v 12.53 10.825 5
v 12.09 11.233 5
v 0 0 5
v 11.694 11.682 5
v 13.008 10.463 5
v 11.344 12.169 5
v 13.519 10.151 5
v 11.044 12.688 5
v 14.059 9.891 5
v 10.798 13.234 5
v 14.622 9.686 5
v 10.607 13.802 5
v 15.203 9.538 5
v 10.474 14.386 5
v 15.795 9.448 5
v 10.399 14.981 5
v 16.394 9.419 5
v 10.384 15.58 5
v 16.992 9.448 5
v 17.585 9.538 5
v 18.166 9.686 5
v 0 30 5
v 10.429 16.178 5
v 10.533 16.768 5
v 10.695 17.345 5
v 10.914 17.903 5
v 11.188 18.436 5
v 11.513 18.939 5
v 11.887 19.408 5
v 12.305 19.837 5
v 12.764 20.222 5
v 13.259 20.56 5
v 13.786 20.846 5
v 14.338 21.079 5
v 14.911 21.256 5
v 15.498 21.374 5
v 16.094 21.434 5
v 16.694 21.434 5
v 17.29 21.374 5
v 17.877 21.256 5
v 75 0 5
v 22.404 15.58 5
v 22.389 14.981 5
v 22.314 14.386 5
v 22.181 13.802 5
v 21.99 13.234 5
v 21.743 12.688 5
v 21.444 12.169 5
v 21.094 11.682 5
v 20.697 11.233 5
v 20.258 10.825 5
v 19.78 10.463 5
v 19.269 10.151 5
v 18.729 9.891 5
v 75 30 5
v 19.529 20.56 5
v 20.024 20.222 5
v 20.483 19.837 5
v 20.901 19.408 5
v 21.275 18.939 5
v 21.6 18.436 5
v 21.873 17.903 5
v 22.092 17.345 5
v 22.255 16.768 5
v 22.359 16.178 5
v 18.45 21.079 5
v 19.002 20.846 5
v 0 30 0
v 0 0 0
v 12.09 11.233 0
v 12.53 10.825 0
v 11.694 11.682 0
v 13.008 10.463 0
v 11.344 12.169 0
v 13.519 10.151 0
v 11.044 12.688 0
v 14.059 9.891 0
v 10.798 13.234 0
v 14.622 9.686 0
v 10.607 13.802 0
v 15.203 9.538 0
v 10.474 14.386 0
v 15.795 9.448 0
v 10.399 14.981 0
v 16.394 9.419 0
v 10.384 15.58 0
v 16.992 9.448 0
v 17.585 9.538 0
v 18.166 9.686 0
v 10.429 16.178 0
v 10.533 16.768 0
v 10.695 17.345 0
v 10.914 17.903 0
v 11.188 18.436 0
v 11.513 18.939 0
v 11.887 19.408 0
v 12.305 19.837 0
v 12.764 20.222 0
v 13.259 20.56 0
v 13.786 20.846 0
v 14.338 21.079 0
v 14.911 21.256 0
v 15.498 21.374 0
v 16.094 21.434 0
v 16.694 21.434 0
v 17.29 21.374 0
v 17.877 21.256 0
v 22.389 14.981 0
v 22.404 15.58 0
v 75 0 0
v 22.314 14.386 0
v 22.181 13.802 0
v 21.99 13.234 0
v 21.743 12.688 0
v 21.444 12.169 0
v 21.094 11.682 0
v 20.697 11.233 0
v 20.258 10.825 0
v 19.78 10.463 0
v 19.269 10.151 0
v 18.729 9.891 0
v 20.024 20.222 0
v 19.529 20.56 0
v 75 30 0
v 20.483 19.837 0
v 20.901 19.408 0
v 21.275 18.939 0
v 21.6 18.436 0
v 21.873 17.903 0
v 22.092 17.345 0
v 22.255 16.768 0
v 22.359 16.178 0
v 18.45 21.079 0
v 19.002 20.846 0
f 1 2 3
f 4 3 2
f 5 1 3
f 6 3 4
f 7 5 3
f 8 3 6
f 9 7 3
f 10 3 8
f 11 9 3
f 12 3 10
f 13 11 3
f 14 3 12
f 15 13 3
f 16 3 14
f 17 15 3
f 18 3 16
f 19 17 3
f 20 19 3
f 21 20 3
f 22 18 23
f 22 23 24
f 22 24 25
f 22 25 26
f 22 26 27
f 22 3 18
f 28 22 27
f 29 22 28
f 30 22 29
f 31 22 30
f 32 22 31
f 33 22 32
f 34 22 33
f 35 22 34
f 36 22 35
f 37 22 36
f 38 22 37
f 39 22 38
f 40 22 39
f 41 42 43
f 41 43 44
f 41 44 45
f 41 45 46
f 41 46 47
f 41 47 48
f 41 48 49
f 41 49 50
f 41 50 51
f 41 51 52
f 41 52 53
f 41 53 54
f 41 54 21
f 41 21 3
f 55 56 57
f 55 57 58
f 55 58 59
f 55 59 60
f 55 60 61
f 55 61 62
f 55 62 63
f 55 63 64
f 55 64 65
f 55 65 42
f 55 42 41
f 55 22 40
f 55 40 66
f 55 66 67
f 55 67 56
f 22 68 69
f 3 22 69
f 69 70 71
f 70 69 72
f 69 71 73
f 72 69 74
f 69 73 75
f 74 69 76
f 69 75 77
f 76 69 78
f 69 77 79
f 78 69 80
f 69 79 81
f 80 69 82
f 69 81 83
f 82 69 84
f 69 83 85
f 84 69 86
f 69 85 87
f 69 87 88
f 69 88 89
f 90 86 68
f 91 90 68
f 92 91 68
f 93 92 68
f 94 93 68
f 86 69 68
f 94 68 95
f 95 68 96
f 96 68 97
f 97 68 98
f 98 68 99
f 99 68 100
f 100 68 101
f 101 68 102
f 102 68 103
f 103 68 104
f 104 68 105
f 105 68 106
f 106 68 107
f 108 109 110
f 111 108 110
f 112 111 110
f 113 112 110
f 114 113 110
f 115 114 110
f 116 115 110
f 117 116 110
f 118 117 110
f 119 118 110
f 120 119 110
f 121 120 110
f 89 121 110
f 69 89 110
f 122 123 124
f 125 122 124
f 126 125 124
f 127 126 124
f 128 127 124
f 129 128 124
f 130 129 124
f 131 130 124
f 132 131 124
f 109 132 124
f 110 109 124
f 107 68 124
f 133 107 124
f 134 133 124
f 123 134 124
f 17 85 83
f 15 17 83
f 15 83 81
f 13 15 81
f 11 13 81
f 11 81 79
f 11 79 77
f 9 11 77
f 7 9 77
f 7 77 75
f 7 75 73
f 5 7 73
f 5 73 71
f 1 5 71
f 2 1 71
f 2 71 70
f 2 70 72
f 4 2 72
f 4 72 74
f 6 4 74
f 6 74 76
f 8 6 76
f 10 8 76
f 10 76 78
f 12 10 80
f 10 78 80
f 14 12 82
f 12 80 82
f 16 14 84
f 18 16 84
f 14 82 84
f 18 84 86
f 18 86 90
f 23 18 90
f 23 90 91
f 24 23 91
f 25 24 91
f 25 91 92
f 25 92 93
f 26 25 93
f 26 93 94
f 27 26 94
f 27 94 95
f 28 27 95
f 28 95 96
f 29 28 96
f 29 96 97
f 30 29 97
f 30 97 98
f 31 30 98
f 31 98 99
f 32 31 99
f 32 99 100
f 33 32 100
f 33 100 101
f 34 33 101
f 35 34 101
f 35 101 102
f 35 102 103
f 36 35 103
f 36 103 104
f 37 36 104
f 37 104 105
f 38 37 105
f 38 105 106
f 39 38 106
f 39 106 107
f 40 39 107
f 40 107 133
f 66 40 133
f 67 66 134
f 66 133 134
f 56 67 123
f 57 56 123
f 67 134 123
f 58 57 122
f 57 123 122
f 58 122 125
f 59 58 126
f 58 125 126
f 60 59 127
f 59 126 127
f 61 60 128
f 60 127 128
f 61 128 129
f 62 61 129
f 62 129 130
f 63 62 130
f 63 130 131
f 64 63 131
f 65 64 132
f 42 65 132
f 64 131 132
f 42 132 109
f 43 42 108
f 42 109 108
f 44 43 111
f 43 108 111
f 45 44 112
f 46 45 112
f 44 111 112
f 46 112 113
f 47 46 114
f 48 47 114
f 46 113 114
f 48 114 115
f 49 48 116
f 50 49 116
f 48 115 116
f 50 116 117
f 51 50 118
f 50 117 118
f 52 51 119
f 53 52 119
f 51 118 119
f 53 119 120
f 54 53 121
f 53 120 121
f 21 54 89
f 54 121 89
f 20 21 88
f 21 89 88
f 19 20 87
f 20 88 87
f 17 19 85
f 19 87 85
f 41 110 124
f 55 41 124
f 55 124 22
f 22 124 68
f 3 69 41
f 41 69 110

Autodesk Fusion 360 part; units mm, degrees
sketch "Sketch1" plane through (0, 0, 0) normal (0, 0, 1) x (1, 0, 0)
  line L0 (0, 0) -> (75, 0)
  line L1 (75, 0) -> (75, 30)
  line L2 (75, 30) -> (0, 30)
  line L3 (0, 30) -> (0, 0)
extrude "Extrude1" add sketch "Sketch1" along normal blind 5
hole "Hole1" at (16.3939, 15.4301, 5) direction (0, 0, -1) diameter 12.023 depth 10 tip angle 180
